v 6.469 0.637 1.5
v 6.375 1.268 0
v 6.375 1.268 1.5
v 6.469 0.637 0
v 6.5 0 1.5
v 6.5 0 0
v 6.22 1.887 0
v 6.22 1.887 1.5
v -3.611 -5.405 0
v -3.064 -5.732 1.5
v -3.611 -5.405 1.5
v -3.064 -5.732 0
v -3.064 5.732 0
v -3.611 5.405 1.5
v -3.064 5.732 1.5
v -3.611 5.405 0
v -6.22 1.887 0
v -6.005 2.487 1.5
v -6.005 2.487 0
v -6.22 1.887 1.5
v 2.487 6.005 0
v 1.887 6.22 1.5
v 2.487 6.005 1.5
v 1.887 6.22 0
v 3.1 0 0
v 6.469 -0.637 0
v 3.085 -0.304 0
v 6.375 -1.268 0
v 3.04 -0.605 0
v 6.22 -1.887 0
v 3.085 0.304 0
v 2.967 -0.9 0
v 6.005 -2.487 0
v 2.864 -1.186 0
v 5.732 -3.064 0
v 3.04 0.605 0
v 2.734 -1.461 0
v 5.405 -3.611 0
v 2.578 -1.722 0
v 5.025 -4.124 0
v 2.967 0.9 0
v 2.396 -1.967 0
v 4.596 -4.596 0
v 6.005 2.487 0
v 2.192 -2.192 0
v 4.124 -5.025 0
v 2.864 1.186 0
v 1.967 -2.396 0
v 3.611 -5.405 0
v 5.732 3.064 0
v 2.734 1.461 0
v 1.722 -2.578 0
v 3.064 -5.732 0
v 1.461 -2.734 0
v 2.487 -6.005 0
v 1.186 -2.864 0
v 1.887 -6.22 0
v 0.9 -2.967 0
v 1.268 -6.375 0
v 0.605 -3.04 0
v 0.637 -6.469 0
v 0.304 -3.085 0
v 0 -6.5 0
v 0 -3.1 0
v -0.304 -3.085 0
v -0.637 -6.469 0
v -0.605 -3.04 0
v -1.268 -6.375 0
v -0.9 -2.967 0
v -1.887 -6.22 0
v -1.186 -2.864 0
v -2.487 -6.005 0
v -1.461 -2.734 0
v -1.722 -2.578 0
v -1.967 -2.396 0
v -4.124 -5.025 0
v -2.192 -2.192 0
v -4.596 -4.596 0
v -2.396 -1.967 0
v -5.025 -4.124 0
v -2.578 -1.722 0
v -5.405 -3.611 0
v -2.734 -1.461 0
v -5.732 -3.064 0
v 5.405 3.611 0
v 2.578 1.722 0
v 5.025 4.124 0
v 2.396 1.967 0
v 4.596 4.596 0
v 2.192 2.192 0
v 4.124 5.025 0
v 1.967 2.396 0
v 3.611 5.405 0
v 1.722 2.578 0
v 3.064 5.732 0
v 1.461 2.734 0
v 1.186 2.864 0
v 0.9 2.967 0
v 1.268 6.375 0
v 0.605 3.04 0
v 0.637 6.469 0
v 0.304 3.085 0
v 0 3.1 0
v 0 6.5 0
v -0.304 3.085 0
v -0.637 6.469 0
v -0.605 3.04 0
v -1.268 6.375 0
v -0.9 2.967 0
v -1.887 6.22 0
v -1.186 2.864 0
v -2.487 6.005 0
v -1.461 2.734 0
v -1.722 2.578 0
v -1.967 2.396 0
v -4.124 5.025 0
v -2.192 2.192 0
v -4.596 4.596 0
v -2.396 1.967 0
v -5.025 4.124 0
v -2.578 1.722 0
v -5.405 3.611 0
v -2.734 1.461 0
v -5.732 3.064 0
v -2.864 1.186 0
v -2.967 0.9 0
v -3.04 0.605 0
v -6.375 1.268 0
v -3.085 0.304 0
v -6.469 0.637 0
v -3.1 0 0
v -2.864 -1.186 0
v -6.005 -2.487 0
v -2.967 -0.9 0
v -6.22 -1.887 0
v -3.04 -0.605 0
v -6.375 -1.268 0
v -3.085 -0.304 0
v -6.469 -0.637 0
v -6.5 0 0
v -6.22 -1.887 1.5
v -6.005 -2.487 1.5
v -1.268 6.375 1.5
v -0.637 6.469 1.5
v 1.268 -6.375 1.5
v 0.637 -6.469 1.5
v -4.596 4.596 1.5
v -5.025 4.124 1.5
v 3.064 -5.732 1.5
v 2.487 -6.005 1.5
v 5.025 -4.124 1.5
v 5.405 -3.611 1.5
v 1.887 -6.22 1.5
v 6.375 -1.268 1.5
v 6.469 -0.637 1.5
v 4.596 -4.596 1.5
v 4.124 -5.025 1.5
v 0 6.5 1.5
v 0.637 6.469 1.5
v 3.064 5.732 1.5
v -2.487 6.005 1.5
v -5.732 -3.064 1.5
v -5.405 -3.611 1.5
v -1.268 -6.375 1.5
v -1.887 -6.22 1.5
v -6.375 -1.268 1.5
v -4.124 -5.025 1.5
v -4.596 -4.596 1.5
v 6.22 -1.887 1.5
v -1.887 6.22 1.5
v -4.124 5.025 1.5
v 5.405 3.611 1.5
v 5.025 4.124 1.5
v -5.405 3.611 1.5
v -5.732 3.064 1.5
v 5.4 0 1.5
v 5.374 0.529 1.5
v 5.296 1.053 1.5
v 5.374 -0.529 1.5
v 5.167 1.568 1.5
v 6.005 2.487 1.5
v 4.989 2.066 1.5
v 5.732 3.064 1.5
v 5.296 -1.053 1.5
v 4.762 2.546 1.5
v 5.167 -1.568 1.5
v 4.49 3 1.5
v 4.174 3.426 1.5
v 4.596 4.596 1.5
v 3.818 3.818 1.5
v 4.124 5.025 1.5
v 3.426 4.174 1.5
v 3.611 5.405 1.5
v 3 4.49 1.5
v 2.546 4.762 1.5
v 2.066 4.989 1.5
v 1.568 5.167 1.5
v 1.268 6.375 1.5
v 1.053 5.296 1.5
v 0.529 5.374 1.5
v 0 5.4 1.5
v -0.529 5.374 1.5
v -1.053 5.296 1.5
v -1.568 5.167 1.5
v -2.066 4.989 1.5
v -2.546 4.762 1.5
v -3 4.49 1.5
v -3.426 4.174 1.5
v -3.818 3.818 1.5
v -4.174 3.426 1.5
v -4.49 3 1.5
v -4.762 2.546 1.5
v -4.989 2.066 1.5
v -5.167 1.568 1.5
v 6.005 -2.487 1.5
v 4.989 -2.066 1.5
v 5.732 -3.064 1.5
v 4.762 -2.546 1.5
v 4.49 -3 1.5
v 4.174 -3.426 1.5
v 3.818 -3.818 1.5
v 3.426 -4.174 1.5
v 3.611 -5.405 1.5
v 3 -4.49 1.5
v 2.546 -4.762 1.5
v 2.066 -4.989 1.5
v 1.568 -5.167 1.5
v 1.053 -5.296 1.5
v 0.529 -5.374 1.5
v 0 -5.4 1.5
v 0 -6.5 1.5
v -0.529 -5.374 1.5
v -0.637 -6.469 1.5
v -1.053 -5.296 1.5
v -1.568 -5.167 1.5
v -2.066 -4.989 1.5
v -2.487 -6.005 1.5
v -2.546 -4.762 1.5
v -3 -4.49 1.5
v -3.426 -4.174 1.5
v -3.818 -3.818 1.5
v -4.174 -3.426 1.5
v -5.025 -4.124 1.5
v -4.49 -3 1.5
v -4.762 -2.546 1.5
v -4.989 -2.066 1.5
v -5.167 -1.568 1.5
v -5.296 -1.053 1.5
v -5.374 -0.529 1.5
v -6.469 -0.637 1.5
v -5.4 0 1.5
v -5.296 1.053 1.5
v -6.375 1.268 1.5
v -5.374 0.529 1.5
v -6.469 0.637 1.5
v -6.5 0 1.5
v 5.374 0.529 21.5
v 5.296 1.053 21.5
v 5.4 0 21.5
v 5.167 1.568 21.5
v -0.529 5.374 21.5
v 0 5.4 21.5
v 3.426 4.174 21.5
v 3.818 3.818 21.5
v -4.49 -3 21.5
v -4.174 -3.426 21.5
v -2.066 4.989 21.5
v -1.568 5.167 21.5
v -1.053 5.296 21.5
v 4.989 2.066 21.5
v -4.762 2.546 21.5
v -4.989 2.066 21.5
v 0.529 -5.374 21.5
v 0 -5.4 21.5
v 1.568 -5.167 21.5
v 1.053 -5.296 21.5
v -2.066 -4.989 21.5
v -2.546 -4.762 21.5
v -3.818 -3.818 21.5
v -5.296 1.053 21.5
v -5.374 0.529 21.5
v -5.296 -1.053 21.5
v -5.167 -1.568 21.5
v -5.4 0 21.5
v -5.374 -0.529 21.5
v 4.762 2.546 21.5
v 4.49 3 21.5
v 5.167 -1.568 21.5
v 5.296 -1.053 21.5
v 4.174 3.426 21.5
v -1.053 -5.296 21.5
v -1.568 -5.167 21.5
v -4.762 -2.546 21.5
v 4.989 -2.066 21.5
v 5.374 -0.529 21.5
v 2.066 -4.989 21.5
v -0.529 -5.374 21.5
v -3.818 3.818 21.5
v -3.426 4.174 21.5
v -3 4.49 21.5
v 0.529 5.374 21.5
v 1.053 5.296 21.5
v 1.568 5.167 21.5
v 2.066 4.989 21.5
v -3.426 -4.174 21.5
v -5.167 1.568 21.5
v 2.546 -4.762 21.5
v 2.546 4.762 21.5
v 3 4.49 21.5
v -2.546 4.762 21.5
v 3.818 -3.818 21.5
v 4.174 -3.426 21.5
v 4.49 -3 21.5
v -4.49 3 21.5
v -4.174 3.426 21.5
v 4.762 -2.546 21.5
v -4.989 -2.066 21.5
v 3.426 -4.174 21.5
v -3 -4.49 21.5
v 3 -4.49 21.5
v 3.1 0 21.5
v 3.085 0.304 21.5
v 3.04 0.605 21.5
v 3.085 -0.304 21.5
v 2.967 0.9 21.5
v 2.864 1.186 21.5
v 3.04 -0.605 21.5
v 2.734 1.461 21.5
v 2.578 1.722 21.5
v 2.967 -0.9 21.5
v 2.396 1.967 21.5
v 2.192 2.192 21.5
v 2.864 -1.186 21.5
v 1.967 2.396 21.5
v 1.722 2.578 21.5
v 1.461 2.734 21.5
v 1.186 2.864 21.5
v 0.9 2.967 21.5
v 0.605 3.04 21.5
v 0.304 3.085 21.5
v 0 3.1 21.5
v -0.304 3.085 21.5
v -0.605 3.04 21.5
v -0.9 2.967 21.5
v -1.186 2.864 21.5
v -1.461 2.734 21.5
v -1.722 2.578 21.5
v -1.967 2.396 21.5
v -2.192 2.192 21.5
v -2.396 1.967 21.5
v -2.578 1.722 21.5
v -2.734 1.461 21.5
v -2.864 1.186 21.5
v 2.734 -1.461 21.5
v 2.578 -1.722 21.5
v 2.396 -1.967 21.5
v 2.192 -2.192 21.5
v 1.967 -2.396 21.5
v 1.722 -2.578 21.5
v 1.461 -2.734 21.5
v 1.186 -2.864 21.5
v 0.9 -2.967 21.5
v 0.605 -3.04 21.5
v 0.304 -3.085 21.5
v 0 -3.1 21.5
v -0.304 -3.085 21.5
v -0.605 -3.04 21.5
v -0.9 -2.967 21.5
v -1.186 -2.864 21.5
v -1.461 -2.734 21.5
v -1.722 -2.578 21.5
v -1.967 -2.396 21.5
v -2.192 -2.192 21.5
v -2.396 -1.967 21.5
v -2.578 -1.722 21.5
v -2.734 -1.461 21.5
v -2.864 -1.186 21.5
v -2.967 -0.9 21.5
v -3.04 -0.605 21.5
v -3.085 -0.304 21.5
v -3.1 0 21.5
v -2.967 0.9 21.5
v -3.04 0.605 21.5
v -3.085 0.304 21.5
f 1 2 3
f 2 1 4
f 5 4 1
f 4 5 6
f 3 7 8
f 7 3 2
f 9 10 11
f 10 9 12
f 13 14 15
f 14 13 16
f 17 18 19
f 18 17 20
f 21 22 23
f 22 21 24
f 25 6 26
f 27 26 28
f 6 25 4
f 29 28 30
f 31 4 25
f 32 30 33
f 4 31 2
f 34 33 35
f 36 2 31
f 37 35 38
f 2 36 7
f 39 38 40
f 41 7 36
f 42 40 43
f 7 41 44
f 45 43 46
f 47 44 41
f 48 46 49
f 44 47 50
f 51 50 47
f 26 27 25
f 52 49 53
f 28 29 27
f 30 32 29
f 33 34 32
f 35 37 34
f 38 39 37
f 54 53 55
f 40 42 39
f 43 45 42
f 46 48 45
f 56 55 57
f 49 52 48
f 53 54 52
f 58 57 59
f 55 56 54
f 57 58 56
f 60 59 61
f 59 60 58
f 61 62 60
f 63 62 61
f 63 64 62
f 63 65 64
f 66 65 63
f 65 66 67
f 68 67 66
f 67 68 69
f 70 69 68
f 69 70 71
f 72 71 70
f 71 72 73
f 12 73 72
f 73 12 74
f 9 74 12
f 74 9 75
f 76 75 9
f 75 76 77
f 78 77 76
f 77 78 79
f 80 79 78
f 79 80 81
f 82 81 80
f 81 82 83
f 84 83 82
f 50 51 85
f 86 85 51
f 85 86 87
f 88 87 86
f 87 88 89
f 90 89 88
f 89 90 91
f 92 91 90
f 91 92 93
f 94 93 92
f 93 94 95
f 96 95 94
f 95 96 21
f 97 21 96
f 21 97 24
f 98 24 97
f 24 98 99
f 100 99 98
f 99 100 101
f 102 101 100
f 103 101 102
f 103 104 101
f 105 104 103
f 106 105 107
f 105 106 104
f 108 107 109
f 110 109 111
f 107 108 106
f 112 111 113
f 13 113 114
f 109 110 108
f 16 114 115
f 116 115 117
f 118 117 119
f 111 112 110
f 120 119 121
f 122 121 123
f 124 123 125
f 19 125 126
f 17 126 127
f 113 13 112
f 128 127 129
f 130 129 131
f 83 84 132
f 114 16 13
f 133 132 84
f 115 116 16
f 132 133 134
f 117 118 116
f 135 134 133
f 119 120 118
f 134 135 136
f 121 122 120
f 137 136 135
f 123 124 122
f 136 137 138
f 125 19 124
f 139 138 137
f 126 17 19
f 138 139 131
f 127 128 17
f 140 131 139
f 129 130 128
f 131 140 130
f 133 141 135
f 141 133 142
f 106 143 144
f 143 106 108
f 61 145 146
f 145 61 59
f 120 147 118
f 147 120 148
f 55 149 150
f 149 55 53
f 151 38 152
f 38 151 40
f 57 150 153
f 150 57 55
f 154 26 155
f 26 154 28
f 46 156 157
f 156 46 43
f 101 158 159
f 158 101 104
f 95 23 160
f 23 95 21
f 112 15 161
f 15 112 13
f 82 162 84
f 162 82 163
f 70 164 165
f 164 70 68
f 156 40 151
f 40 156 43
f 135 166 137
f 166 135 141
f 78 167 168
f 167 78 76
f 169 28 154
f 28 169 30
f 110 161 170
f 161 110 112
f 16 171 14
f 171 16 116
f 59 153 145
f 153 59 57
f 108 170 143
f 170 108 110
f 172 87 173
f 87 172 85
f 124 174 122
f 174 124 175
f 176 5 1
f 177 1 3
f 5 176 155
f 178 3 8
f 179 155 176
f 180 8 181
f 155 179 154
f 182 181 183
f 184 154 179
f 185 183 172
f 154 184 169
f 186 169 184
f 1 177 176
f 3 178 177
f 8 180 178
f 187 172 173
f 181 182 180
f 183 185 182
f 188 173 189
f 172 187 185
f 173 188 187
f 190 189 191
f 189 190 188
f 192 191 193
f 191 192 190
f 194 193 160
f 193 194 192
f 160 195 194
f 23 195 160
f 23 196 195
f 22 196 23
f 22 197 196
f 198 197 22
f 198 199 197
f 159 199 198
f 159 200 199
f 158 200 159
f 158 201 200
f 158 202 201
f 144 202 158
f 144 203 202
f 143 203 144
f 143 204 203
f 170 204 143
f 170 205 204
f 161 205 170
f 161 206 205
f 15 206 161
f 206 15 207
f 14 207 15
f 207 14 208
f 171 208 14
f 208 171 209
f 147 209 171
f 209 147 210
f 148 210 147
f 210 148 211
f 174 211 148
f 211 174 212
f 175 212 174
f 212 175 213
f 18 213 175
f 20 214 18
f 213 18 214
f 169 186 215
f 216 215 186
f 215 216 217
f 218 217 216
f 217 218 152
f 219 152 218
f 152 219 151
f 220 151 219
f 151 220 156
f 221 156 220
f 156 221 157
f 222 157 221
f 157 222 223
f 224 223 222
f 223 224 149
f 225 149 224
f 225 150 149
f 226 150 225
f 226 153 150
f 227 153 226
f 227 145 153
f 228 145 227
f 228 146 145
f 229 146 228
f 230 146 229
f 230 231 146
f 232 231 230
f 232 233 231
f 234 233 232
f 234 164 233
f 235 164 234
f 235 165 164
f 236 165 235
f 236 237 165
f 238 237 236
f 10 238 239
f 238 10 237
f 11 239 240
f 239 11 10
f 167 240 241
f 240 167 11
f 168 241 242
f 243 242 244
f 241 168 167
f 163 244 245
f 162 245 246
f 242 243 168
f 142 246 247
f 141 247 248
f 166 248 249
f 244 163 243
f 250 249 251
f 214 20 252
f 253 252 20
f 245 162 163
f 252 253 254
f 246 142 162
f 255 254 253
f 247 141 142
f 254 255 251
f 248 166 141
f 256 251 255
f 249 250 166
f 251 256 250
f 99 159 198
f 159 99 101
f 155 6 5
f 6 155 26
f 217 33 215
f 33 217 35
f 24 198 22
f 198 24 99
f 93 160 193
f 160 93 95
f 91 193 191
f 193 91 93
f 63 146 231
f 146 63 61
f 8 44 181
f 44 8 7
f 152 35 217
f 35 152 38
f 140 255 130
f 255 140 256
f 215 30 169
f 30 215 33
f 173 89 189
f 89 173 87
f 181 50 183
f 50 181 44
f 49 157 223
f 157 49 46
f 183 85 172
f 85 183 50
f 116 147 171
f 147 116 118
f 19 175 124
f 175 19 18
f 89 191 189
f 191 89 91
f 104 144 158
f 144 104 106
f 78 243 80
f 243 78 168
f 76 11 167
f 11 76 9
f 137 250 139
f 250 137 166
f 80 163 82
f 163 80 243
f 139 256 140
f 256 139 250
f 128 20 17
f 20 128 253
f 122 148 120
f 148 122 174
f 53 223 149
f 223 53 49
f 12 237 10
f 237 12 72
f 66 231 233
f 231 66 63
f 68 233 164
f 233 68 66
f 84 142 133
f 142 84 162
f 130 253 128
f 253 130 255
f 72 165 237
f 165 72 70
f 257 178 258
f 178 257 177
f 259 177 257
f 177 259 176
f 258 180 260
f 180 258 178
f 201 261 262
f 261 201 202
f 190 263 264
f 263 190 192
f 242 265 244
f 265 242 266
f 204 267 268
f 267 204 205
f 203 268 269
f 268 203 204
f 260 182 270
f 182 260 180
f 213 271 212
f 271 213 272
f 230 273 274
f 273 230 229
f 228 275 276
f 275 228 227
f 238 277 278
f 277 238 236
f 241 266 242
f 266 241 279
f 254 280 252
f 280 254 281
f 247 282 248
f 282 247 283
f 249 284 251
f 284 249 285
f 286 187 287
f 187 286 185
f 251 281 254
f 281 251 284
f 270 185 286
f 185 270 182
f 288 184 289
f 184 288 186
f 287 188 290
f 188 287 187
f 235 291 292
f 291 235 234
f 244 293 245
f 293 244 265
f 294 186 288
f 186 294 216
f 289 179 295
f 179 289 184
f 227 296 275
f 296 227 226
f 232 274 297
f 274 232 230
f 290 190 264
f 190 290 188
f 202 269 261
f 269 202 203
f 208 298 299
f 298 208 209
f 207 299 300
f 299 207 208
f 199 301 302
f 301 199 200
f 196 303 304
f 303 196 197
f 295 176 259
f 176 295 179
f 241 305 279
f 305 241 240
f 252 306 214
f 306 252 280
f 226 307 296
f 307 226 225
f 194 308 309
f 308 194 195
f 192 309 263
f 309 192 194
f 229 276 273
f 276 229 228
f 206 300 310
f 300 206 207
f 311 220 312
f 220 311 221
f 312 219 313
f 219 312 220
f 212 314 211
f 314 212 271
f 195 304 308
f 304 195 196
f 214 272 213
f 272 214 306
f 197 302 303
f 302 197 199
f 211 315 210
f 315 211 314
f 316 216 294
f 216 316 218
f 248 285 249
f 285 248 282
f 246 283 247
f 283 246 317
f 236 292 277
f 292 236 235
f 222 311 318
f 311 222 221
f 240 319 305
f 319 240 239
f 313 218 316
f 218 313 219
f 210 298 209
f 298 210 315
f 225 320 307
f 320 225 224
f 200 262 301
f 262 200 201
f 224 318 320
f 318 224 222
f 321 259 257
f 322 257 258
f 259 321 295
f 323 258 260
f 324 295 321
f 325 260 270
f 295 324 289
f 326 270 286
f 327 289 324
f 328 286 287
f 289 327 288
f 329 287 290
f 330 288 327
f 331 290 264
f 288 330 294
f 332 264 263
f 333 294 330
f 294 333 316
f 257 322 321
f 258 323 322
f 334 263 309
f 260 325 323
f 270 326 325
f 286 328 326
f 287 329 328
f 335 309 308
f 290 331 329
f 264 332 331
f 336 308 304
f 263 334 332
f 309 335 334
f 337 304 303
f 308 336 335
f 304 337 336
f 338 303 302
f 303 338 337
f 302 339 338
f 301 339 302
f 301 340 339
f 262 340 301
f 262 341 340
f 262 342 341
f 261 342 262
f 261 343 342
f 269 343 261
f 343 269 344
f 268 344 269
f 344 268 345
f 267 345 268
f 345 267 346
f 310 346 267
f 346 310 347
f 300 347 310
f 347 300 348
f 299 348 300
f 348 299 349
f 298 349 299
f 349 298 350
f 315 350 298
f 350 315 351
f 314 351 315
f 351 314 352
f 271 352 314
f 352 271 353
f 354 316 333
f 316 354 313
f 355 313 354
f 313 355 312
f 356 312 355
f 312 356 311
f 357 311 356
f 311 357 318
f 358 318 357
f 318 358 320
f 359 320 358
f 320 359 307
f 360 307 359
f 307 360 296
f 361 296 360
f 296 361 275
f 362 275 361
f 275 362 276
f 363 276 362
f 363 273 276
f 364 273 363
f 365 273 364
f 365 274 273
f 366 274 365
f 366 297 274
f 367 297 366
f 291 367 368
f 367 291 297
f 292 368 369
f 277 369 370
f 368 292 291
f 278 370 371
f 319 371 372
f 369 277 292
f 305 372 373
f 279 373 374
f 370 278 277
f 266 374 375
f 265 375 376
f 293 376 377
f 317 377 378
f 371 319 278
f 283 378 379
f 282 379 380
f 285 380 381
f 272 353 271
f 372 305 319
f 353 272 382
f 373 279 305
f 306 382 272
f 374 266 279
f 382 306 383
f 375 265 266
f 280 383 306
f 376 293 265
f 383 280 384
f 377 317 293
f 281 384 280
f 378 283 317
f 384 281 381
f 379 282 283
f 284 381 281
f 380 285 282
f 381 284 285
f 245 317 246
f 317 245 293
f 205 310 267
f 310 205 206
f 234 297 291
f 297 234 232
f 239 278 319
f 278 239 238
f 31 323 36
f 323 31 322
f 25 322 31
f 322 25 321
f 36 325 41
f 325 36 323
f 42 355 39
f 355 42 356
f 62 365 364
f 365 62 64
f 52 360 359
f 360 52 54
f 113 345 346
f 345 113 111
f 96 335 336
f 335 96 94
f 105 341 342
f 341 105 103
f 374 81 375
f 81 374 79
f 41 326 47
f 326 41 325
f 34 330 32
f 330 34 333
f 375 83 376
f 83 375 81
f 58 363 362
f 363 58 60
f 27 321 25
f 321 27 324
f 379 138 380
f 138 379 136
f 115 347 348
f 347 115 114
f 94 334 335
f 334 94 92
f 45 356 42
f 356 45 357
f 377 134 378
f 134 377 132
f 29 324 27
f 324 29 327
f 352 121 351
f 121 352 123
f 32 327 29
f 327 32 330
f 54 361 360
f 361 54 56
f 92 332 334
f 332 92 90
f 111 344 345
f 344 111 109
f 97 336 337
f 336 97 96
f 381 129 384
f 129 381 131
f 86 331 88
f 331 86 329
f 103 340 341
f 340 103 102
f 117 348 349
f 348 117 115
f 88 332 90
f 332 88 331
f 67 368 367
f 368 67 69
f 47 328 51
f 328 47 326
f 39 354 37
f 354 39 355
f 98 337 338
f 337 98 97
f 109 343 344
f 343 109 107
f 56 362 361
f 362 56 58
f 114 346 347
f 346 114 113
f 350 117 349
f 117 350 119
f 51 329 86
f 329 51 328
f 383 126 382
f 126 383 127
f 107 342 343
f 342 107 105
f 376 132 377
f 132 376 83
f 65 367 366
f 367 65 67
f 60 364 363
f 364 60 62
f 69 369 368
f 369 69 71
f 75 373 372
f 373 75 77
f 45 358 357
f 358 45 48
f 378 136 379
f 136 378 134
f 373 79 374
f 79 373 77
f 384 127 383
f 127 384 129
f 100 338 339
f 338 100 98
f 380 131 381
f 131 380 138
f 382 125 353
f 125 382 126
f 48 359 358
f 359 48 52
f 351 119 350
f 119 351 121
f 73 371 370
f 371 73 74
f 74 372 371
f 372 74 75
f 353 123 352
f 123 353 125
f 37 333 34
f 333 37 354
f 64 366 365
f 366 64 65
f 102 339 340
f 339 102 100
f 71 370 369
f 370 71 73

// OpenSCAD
// Adapter sleeve for 0.2 mL PCR tube to fit 1.5 mL rack hole
// Units: millimetres

// Collar dimensions (bottom part resting on bed)
collar_d = 13;
collar_h = 1.5;

// Sleeve body dimensions (upper part)
body_d = 10.8;
total_h = 21.5;
body_h = total_h - collar_h;

// Bore dimensions (through-hole)
bore_d = 6.2;
// Bore cutter must extend past faces to avoid coplanar issues (Rule 5)
// Extends 0.1mm past bottom (z=0) and 0.1mm past top (z=21.5)
bore_h = total_h + 0.2; 
bore_offset = -0.1;

// Global setting for curved shapes to ensure roundness
$fn = 64;

// Main part definition
difference() {
    // Union of collar and body
    union() {
        // Collar: z = 0 to 1.5
        cylinder(h=collar_h, d=collar_d);
        
        // Body: z = 1.5 to 21.5
        // Translate up by collar height
        translate([0, 0, collar_h])
            cylinder(h=body_h, d=body_d);
    }
    
    // Bore: z = -0.1 to 21.6 (extends past top and bottom faces)
    translate([0, 0, bore_offset])
        cylinder(h=bore_h, d=bore_d);
}
